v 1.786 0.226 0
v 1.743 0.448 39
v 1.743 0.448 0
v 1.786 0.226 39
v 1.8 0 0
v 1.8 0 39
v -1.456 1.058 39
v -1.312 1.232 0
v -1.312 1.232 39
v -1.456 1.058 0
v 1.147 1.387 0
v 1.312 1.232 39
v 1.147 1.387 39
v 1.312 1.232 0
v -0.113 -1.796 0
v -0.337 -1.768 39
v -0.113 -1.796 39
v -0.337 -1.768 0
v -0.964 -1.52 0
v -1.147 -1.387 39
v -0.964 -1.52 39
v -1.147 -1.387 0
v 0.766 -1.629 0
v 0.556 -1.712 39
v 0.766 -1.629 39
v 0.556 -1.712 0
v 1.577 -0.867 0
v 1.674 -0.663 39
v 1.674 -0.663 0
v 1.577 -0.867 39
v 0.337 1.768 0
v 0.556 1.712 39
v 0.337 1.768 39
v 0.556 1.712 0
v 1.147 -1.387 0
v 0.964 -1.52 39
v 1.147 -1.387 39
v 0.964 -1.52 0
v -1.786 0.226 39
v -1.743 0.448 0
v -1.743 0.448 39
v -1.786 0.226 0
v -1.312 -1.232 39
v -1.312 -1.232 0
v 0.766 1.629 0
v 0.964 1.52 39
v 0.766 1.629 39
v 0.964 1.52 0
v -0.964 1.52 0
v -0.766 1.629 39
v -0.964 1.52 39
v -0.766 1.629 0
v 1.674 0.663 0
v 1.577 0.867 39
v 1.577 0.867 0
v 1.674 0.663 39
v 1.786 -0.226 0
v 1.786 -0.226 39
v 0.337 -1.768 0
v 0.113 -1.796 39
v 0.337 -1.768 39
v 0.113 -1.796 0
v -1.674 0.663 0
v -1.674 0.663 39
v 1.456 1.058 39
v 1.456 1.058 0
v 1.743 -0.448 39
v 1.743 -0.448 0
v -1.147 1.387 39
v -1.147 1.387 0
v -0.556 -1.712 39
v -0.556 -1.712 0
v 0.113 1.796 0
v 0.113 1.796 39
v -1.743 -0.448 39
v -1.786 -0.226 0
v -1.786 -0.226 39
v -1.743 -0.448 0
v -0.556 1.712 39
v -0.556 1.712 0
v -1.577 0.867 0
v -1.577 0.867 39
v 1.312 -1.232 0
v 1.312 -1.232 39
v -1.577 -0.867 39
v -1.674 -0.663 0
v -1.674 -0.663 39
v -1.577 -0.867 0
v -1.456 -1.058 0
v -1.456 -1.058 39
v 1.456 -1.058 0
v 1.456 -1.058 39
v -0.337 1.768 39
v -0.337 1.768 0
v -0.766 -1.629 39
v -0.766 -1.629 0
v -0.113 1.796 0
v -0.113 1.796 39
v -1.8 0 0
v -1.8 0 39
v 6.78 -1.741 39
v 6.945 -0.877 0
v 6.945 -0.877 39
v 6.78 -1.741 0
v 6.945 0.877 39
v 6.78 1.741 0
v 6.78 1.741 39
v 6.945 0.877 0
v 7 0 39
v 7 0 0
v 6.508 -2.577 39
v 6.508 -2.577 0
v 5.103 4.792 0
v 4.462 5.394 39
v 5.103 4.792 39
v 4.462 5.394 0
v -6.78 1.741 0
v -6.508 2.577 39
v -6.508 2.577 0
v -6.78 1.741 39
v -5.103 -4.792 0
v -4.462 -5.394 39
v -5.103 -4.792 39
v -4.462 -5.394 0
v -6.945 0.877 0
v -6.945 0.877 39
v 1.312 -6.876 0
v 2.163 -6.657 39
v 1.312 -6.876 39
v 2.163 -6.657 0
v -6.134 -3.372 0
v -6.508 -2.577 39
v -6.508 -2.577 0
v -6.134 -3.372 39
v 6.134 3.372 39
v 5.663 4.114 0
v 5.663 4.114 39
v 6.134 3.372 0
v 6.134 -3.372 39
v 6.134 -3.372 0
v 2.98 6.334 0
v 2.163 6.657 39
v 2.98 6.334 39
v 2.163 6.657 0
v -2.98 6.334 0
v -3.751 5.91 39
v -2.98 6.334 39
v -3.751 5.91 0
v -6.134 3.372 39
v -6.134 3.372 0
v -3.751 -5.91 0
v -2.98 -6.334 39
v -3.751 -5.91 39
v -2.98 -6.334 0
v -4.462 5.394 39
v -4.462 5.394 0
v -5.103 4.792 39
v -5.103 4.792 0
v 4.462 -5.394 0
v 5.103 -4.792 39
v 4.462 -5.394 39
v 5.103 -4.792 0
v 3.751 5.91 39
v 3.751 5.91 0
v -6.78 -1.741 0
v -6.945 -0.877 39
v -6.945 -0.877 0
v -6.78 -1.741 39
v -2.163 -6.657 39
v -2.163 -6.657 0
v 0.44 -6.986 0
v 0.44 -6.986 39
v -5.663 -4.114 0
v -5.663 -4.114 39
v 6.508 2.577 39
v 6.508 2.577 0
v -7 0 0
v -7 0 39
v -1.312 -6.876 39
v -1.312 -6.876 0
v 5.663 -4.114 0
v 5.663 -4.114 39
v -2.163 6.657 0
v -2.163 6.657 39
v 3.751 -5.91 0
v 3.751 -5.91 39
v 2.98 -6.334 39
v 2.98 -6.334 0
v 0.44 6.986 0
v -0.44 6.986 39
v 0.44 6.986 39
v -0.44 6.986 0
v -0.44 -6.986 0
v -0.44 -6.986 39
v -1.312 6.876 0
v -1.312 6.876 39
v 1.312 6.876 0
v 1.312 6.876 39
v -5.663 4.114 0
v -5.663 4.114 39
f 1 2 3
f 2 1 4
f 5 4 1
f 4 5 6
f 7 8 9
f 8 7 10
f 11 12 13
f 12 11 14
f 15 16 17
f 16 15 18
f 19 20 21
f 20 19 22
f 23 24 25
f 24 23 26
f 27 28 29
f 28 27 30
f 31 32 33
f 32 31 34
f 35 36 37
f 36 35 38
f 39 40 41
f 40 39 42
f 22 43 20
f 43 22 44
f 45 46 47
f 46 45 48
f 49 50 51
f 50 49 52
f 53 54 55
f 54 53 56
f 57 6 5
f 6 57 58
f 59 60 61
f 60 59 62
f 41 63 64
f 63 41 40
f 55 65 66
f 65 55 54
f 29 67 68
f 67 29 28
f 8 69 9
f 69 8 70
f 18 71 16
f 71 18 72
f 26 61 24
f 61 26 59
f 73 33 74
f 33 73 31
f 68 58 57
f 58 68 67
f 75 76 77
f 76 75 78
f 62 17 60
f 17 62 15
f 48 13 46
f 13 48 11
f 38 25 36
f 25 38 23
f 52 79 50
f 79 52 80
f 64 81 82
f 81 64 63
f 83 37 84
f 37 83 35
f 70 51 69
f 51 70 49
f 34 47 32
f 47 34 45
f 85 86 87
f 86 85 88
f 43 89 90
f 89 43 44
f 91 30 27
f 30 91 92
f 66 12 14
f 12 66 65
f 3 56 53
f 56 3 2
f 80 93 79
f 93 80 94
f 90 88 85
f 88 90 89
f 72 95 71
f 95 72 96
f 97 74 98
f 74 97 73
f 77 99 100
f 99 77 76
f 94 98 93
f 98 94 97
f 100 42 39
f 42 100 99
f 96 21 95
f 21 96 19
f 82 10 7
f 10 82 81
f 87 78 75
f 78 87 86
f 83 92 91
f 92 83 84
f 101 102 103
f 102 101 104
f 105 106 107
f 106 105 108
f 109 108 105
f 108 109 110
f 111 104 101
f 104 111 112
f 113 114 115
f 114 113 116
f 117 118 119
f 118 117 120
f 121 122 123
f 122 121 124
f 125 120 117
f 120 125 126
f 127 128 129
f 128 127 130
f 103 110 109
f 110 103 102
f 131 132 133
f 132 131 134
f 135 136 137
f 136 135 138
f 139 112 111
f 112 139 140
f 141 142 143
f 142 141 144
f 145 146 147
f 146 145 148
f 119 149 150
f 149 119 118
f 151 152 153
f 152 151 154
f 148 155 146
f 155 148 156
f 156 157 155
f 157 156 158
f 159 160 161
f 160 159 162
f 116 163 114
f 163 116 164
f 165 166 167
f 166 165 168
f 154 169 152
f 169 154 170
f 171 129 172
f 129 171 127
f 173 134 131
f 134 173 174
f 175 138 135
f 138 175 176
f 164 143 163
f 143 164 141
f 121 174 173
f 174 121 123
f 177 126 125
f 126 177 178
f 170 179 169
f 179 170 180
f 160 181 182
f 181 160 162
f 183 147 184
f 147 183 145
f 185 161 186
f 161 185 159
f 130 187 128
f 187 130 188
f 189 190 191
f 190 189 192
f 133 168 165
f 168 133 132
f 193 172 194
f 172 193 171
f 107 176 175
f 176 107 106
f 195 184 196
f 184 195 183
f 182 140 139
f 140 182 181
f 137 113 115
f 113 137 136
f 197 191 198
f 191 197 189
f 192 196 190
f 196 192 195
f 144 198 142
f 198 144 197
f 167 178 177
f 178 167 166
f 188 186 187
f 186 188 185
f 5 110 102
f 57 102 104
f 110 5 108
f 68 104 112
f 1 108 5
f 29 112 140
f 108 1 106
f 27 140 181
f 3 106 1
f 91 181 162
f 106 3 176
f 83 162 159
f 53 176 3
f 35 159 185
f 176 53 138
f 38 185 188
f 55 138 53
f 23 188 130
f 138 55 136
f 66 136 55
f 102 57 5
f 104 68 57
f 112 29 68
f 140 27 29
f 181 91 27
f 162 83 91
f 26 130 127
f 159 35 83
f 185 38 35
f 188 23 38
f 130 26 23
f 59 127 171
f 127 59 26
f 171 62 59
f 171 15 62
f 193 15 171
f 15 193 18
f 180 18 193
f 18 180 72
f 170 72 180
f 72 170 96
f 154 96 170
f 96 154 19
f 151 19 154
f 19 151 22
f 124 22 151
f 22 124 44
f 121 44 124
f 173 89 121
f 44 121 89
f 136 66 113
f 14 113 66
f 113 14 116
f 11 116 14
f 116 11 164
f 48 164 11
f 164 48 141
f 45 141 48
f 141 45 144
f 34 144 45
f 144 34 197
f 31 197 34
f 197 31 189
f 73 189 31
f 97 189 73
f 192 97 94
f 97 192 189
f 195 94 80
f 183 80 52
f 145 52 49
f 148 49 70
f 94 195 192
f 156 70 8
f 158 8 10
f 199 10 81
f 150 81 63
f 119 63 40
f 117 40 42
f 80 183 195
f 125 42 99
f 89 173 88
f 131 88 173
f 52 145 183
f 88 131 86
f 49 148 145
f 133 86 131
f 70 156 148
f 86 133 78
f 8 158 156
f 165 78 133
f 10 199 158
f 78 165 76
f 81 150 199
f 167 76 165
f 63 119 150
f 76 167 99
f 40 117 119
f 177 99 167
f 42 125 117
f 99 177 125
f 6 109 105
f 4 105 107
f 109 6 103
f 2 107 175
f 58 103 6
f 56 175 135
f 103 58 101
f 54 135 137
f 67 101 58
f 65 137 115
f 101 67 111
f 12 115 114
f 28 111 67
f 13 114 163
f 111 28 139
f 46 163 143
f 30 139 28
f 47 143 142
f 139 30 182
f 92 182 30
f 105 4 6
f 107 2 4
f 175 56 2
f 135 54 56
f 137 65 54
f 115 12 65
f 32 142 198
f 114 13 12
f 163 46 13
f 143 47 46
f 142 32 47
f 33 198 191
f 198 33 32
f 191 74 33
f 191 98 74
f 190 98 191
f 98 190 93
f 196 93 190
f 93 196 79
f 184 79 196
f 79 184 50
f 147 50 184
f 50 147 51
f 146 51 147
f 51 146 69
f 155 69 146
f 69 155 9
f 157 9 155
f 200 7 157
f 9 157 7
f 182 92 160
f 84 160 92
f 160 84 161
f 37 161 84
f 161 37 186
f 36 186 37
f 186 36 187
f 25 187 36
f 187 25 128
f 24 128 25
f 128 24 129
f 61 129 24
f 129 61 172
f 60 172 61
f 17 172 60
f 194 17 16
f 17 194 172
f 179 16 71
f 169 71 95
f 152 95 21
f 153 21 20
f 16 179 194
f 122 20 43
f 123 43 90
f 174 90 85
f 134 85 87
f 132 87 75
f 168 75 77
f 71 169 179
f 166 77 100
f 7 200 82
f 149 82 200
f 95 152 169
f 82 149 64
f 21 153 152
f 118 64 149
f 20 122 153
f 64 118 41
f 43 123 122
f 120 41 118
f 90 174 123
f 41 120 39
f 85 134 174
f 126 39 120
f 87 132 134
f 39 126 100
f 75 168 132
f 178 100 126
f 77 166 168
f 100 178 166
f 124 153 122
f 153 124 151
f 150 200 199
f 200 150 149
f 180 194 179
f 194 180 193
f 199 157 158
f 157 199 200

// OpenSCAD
$fn = 50;


difference() {
	union() {
		cylinder(h = 39, r = 7.0000000000);
	}
	union() {
		translate(v = [0.0000000000, 0.0000000000, -100.0000000000]) {
			cylinder(h = 200, r = 1.8000000000);
		}
		cylinder(h = 39, r = 1.8000000000);
		cylinder(h = 39, r = 1.8000000000);
		cylinder(h = 39, r = 1.8000000000);
	}
}
